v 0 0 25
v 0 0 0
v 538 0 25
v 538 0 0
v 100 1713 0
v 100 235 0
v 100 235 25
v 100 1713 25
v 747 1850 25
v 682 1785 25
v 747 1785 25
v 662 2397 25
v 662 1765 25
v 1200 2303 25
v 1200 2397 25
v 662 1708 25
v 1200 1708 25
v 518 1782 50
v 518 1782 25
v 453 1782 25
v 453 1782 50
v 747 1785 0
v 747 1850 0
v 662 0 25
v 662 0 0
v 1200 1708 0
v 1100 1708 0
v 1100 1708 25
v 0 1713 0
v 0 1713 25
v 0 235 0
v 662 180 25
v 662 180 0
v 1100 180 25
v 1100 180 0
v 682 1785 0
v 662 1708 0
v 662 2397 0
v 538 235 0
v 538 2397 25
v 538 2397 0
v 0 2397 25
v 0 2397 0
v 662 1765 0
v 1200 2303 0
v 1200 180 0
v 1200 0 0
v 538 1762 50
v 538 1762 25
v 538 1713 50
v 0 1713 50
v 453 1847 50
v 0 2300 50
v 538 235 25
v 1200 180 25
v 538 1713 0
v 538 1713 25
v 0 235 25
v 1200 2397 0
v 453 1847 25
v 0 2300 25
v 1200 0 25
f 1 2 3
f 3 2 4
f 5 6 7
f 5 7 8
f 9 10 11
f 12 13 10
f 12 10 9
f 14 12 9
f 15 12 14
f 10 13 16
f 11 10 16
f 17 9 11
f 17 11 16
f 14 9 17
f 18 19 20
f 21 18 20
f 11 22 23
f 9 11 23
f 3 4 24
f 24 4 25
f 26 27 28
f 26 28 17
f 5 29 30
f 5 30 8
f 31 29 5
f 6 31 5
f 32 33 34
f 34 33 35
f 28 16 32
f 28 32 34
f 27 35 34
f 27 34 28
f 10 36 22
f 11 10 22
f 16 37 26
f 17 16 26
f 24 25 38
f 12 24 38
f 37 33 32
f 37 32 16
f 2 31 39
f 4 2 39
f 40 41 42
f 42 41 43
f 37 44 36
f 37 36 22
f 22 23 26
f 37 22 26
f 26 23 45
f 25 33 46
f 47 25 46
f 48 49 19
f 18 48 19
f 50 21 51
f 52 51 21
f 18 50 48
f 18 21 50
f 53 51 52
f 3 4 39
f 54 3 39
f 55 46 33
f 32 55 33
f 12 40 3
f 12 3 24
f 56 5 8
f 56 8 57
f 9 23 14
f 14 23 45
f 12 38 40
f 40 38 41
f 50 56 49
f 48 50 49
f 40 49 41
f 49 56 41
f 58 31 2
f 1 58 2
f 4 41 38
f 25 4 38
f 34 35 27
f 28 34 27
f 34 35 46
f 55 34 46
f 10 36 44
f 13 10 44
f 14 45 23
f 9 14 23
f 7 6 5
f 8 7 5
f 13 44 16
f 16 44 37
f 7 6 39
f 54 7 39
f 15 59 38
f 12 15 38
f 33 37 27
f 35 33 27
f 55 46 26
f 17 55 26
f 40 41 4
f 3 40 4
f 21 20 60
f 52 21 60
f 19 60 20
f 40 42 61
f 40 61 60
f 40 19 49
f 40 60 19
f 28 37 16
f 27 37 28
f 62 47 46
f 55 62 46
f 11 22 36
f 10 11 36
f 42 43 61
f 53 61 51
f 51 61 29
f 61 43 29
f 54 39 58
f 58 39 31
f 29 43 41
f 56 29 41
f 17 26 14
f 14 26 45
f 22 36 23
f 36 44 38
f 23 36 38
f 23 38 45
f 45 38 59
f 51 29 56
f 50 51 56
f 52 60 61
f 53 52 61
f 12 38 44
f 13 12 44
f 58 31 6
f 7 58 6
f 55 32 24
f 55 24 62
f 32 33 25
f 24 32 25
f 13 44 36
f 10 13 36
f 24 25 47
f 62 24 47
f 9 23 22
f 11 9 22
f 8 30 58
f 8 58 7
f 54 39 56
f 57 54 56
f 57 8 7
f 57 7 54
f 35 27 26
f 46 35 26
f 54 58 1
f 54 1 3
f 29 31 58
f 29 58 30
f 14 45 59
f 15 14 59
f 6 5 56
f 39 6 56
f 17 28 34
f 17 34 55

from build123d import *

# Parameters (mm, degrees)
F0_W     = 438
F0_H     = 1478
F1_DEPTH = 25
F0_H_2   = 1528
F2_DEPTH = 25
F0_W_2   = 100
F3_DEPTH = 25
F0_W_3   = 99.9999523163
F4_DEPTH = 25
F5_DEPTH = 25


# Not quite as in the source:
# - ends of sketch curves that miss each other by under 0.0002 mm in the source are joined


with BuildPart() as f1:
    # F0 (on Top) → F1 (new body)
    with BuildSketch(Plane.XY):
        with Locations((319, 974)):
            Rectangle(F0_W, F0_H)
    extrude(amount=F1_DEPTH)


with BuildPart() as f1b:
    # F0 (on Top) → F1, piece 2 (new body)
    with BuildSketch(Plane.XY):
        with Locations((881.0000476837, 944)):
            Rectangle(F0_W, F0_H_2)
    extrude(amount=F1_DEPTH)


with BuildPart() as f2:
    # F0 (on Top) → F2 (new body)
    with BuildSketch(Plane.XY):
        Polygon((682.0000476837, 1785), (662.0000476837, 1765), (662.0000476837, 1708), (1100.0000476837, 1708), (1200.0000476837, 1708), (1200, 2303), (747.0000476837, 1850), (747.0000476837, 1785), align=None)
    extrude(amount=F2_DEPTH)


with BuildPart() as f2b:
    # F0 (on Top) → F2, piece 2 (new body)
    with BuildSketch(Plane.XY):
        Polygon((1100.0000476837, 180), (662.0000476837, 180), (662.0000476837, 0), (1200.0000476837, 0), (1200, 180), align=None)
    extrude(amount=F2_DEPTH)


with BuildPart() as f2c:
    # F0 (on Top) → F2, piece 3 (new body)
    with BuildSketch(Plane.XY):
        Polygon((100, 235), (0, 235), (0, 0), (538, 0), (538, 235), align=None)
    extrude(amount=F2_DEPTH)


with BuildPart() as f2d:
    # F0 (on Top) → F2, piece 4 (new body)
    with BuildSketch(Plane.XY):
        Polygon((453, 1847), (0, 2300), (0, 1713), (100, 1713), (538, 1713), (538, 1762), (518, 1782), (453, 1782), align=None)
    extrude(amount=F2_DEPTH)

    # F0 (on Top) + F2_face (on face) → F4 (join)
    with BuildSketch(Plane.XY):
        Polygon((1200, 2397), (662.0000476837, 2397), (662.0000476837, 1765), (682.0000476837, 1785), (747.0000476837, 1785), (747.0000476837, 1850), (1200.0000476837, 2303), align=None)
        Polygon((538, 2397), (0, 2397), (0, 2300), (453, 1847), (453, 1782), (518, 1782), (538, 1762), align=None)
    with BuildSketch(Plane(origin=(189.6303420005, 1911.2535062619, 25), x_dir=(1, 0, 0), z_dir=(0, 0, 1))):
        Polygon((263.3696579995, -64.2535062619), (-189.6303420005, 388.7464937381), (-189.6303420005, -198.2535062619), (348.3696579995, -198.2535062619), (348.3696579995, -149.2535062619), (328.3696579995, -129.2535062619), (263.3696579995, -129.2535062619), align=None)
    extrude(amount=F4_DEPTH)


with BuildPart() as f3:
    # F0 (on Top) → F3 (new body)
    with BuildSketch(Plane.XY):
        with Locations((50, 974)):
            Rectangle(F0_W_2, F0_H)
    extrude(amount=F3_DEPTH)


with BuildPart() as f3b:
    # F0 (on Top) → F3, piece 2 (new body)
    with BuildSketch(Plane.XY):
        with Locations((1150.0000238419, 944)):
            Rectangle(F0_W_3, F0_H_2)
    extrude(amount=F3_DEPTH)


with BuildPart() as f5:
    # F0 (on Top) → F5 (new body)
    with BuildSketch(Plane.XY):
        Polygon((662.0000476837, 2397), (538, 2397), (538, 1762), (538, 1713), (538, 235), (538, 0), (662.0000476837, 0), (662.0000476837, 180), (662.0000476837, 1708), (662.0000476837, 1765), align=None)
    extrude(amount=F5_DEPTH)


solid = Compound([f1.part, f1b.part, f2.part, f2b.part, f2c.part, f2d.part, f3.part, f3b.part, f5.part])
